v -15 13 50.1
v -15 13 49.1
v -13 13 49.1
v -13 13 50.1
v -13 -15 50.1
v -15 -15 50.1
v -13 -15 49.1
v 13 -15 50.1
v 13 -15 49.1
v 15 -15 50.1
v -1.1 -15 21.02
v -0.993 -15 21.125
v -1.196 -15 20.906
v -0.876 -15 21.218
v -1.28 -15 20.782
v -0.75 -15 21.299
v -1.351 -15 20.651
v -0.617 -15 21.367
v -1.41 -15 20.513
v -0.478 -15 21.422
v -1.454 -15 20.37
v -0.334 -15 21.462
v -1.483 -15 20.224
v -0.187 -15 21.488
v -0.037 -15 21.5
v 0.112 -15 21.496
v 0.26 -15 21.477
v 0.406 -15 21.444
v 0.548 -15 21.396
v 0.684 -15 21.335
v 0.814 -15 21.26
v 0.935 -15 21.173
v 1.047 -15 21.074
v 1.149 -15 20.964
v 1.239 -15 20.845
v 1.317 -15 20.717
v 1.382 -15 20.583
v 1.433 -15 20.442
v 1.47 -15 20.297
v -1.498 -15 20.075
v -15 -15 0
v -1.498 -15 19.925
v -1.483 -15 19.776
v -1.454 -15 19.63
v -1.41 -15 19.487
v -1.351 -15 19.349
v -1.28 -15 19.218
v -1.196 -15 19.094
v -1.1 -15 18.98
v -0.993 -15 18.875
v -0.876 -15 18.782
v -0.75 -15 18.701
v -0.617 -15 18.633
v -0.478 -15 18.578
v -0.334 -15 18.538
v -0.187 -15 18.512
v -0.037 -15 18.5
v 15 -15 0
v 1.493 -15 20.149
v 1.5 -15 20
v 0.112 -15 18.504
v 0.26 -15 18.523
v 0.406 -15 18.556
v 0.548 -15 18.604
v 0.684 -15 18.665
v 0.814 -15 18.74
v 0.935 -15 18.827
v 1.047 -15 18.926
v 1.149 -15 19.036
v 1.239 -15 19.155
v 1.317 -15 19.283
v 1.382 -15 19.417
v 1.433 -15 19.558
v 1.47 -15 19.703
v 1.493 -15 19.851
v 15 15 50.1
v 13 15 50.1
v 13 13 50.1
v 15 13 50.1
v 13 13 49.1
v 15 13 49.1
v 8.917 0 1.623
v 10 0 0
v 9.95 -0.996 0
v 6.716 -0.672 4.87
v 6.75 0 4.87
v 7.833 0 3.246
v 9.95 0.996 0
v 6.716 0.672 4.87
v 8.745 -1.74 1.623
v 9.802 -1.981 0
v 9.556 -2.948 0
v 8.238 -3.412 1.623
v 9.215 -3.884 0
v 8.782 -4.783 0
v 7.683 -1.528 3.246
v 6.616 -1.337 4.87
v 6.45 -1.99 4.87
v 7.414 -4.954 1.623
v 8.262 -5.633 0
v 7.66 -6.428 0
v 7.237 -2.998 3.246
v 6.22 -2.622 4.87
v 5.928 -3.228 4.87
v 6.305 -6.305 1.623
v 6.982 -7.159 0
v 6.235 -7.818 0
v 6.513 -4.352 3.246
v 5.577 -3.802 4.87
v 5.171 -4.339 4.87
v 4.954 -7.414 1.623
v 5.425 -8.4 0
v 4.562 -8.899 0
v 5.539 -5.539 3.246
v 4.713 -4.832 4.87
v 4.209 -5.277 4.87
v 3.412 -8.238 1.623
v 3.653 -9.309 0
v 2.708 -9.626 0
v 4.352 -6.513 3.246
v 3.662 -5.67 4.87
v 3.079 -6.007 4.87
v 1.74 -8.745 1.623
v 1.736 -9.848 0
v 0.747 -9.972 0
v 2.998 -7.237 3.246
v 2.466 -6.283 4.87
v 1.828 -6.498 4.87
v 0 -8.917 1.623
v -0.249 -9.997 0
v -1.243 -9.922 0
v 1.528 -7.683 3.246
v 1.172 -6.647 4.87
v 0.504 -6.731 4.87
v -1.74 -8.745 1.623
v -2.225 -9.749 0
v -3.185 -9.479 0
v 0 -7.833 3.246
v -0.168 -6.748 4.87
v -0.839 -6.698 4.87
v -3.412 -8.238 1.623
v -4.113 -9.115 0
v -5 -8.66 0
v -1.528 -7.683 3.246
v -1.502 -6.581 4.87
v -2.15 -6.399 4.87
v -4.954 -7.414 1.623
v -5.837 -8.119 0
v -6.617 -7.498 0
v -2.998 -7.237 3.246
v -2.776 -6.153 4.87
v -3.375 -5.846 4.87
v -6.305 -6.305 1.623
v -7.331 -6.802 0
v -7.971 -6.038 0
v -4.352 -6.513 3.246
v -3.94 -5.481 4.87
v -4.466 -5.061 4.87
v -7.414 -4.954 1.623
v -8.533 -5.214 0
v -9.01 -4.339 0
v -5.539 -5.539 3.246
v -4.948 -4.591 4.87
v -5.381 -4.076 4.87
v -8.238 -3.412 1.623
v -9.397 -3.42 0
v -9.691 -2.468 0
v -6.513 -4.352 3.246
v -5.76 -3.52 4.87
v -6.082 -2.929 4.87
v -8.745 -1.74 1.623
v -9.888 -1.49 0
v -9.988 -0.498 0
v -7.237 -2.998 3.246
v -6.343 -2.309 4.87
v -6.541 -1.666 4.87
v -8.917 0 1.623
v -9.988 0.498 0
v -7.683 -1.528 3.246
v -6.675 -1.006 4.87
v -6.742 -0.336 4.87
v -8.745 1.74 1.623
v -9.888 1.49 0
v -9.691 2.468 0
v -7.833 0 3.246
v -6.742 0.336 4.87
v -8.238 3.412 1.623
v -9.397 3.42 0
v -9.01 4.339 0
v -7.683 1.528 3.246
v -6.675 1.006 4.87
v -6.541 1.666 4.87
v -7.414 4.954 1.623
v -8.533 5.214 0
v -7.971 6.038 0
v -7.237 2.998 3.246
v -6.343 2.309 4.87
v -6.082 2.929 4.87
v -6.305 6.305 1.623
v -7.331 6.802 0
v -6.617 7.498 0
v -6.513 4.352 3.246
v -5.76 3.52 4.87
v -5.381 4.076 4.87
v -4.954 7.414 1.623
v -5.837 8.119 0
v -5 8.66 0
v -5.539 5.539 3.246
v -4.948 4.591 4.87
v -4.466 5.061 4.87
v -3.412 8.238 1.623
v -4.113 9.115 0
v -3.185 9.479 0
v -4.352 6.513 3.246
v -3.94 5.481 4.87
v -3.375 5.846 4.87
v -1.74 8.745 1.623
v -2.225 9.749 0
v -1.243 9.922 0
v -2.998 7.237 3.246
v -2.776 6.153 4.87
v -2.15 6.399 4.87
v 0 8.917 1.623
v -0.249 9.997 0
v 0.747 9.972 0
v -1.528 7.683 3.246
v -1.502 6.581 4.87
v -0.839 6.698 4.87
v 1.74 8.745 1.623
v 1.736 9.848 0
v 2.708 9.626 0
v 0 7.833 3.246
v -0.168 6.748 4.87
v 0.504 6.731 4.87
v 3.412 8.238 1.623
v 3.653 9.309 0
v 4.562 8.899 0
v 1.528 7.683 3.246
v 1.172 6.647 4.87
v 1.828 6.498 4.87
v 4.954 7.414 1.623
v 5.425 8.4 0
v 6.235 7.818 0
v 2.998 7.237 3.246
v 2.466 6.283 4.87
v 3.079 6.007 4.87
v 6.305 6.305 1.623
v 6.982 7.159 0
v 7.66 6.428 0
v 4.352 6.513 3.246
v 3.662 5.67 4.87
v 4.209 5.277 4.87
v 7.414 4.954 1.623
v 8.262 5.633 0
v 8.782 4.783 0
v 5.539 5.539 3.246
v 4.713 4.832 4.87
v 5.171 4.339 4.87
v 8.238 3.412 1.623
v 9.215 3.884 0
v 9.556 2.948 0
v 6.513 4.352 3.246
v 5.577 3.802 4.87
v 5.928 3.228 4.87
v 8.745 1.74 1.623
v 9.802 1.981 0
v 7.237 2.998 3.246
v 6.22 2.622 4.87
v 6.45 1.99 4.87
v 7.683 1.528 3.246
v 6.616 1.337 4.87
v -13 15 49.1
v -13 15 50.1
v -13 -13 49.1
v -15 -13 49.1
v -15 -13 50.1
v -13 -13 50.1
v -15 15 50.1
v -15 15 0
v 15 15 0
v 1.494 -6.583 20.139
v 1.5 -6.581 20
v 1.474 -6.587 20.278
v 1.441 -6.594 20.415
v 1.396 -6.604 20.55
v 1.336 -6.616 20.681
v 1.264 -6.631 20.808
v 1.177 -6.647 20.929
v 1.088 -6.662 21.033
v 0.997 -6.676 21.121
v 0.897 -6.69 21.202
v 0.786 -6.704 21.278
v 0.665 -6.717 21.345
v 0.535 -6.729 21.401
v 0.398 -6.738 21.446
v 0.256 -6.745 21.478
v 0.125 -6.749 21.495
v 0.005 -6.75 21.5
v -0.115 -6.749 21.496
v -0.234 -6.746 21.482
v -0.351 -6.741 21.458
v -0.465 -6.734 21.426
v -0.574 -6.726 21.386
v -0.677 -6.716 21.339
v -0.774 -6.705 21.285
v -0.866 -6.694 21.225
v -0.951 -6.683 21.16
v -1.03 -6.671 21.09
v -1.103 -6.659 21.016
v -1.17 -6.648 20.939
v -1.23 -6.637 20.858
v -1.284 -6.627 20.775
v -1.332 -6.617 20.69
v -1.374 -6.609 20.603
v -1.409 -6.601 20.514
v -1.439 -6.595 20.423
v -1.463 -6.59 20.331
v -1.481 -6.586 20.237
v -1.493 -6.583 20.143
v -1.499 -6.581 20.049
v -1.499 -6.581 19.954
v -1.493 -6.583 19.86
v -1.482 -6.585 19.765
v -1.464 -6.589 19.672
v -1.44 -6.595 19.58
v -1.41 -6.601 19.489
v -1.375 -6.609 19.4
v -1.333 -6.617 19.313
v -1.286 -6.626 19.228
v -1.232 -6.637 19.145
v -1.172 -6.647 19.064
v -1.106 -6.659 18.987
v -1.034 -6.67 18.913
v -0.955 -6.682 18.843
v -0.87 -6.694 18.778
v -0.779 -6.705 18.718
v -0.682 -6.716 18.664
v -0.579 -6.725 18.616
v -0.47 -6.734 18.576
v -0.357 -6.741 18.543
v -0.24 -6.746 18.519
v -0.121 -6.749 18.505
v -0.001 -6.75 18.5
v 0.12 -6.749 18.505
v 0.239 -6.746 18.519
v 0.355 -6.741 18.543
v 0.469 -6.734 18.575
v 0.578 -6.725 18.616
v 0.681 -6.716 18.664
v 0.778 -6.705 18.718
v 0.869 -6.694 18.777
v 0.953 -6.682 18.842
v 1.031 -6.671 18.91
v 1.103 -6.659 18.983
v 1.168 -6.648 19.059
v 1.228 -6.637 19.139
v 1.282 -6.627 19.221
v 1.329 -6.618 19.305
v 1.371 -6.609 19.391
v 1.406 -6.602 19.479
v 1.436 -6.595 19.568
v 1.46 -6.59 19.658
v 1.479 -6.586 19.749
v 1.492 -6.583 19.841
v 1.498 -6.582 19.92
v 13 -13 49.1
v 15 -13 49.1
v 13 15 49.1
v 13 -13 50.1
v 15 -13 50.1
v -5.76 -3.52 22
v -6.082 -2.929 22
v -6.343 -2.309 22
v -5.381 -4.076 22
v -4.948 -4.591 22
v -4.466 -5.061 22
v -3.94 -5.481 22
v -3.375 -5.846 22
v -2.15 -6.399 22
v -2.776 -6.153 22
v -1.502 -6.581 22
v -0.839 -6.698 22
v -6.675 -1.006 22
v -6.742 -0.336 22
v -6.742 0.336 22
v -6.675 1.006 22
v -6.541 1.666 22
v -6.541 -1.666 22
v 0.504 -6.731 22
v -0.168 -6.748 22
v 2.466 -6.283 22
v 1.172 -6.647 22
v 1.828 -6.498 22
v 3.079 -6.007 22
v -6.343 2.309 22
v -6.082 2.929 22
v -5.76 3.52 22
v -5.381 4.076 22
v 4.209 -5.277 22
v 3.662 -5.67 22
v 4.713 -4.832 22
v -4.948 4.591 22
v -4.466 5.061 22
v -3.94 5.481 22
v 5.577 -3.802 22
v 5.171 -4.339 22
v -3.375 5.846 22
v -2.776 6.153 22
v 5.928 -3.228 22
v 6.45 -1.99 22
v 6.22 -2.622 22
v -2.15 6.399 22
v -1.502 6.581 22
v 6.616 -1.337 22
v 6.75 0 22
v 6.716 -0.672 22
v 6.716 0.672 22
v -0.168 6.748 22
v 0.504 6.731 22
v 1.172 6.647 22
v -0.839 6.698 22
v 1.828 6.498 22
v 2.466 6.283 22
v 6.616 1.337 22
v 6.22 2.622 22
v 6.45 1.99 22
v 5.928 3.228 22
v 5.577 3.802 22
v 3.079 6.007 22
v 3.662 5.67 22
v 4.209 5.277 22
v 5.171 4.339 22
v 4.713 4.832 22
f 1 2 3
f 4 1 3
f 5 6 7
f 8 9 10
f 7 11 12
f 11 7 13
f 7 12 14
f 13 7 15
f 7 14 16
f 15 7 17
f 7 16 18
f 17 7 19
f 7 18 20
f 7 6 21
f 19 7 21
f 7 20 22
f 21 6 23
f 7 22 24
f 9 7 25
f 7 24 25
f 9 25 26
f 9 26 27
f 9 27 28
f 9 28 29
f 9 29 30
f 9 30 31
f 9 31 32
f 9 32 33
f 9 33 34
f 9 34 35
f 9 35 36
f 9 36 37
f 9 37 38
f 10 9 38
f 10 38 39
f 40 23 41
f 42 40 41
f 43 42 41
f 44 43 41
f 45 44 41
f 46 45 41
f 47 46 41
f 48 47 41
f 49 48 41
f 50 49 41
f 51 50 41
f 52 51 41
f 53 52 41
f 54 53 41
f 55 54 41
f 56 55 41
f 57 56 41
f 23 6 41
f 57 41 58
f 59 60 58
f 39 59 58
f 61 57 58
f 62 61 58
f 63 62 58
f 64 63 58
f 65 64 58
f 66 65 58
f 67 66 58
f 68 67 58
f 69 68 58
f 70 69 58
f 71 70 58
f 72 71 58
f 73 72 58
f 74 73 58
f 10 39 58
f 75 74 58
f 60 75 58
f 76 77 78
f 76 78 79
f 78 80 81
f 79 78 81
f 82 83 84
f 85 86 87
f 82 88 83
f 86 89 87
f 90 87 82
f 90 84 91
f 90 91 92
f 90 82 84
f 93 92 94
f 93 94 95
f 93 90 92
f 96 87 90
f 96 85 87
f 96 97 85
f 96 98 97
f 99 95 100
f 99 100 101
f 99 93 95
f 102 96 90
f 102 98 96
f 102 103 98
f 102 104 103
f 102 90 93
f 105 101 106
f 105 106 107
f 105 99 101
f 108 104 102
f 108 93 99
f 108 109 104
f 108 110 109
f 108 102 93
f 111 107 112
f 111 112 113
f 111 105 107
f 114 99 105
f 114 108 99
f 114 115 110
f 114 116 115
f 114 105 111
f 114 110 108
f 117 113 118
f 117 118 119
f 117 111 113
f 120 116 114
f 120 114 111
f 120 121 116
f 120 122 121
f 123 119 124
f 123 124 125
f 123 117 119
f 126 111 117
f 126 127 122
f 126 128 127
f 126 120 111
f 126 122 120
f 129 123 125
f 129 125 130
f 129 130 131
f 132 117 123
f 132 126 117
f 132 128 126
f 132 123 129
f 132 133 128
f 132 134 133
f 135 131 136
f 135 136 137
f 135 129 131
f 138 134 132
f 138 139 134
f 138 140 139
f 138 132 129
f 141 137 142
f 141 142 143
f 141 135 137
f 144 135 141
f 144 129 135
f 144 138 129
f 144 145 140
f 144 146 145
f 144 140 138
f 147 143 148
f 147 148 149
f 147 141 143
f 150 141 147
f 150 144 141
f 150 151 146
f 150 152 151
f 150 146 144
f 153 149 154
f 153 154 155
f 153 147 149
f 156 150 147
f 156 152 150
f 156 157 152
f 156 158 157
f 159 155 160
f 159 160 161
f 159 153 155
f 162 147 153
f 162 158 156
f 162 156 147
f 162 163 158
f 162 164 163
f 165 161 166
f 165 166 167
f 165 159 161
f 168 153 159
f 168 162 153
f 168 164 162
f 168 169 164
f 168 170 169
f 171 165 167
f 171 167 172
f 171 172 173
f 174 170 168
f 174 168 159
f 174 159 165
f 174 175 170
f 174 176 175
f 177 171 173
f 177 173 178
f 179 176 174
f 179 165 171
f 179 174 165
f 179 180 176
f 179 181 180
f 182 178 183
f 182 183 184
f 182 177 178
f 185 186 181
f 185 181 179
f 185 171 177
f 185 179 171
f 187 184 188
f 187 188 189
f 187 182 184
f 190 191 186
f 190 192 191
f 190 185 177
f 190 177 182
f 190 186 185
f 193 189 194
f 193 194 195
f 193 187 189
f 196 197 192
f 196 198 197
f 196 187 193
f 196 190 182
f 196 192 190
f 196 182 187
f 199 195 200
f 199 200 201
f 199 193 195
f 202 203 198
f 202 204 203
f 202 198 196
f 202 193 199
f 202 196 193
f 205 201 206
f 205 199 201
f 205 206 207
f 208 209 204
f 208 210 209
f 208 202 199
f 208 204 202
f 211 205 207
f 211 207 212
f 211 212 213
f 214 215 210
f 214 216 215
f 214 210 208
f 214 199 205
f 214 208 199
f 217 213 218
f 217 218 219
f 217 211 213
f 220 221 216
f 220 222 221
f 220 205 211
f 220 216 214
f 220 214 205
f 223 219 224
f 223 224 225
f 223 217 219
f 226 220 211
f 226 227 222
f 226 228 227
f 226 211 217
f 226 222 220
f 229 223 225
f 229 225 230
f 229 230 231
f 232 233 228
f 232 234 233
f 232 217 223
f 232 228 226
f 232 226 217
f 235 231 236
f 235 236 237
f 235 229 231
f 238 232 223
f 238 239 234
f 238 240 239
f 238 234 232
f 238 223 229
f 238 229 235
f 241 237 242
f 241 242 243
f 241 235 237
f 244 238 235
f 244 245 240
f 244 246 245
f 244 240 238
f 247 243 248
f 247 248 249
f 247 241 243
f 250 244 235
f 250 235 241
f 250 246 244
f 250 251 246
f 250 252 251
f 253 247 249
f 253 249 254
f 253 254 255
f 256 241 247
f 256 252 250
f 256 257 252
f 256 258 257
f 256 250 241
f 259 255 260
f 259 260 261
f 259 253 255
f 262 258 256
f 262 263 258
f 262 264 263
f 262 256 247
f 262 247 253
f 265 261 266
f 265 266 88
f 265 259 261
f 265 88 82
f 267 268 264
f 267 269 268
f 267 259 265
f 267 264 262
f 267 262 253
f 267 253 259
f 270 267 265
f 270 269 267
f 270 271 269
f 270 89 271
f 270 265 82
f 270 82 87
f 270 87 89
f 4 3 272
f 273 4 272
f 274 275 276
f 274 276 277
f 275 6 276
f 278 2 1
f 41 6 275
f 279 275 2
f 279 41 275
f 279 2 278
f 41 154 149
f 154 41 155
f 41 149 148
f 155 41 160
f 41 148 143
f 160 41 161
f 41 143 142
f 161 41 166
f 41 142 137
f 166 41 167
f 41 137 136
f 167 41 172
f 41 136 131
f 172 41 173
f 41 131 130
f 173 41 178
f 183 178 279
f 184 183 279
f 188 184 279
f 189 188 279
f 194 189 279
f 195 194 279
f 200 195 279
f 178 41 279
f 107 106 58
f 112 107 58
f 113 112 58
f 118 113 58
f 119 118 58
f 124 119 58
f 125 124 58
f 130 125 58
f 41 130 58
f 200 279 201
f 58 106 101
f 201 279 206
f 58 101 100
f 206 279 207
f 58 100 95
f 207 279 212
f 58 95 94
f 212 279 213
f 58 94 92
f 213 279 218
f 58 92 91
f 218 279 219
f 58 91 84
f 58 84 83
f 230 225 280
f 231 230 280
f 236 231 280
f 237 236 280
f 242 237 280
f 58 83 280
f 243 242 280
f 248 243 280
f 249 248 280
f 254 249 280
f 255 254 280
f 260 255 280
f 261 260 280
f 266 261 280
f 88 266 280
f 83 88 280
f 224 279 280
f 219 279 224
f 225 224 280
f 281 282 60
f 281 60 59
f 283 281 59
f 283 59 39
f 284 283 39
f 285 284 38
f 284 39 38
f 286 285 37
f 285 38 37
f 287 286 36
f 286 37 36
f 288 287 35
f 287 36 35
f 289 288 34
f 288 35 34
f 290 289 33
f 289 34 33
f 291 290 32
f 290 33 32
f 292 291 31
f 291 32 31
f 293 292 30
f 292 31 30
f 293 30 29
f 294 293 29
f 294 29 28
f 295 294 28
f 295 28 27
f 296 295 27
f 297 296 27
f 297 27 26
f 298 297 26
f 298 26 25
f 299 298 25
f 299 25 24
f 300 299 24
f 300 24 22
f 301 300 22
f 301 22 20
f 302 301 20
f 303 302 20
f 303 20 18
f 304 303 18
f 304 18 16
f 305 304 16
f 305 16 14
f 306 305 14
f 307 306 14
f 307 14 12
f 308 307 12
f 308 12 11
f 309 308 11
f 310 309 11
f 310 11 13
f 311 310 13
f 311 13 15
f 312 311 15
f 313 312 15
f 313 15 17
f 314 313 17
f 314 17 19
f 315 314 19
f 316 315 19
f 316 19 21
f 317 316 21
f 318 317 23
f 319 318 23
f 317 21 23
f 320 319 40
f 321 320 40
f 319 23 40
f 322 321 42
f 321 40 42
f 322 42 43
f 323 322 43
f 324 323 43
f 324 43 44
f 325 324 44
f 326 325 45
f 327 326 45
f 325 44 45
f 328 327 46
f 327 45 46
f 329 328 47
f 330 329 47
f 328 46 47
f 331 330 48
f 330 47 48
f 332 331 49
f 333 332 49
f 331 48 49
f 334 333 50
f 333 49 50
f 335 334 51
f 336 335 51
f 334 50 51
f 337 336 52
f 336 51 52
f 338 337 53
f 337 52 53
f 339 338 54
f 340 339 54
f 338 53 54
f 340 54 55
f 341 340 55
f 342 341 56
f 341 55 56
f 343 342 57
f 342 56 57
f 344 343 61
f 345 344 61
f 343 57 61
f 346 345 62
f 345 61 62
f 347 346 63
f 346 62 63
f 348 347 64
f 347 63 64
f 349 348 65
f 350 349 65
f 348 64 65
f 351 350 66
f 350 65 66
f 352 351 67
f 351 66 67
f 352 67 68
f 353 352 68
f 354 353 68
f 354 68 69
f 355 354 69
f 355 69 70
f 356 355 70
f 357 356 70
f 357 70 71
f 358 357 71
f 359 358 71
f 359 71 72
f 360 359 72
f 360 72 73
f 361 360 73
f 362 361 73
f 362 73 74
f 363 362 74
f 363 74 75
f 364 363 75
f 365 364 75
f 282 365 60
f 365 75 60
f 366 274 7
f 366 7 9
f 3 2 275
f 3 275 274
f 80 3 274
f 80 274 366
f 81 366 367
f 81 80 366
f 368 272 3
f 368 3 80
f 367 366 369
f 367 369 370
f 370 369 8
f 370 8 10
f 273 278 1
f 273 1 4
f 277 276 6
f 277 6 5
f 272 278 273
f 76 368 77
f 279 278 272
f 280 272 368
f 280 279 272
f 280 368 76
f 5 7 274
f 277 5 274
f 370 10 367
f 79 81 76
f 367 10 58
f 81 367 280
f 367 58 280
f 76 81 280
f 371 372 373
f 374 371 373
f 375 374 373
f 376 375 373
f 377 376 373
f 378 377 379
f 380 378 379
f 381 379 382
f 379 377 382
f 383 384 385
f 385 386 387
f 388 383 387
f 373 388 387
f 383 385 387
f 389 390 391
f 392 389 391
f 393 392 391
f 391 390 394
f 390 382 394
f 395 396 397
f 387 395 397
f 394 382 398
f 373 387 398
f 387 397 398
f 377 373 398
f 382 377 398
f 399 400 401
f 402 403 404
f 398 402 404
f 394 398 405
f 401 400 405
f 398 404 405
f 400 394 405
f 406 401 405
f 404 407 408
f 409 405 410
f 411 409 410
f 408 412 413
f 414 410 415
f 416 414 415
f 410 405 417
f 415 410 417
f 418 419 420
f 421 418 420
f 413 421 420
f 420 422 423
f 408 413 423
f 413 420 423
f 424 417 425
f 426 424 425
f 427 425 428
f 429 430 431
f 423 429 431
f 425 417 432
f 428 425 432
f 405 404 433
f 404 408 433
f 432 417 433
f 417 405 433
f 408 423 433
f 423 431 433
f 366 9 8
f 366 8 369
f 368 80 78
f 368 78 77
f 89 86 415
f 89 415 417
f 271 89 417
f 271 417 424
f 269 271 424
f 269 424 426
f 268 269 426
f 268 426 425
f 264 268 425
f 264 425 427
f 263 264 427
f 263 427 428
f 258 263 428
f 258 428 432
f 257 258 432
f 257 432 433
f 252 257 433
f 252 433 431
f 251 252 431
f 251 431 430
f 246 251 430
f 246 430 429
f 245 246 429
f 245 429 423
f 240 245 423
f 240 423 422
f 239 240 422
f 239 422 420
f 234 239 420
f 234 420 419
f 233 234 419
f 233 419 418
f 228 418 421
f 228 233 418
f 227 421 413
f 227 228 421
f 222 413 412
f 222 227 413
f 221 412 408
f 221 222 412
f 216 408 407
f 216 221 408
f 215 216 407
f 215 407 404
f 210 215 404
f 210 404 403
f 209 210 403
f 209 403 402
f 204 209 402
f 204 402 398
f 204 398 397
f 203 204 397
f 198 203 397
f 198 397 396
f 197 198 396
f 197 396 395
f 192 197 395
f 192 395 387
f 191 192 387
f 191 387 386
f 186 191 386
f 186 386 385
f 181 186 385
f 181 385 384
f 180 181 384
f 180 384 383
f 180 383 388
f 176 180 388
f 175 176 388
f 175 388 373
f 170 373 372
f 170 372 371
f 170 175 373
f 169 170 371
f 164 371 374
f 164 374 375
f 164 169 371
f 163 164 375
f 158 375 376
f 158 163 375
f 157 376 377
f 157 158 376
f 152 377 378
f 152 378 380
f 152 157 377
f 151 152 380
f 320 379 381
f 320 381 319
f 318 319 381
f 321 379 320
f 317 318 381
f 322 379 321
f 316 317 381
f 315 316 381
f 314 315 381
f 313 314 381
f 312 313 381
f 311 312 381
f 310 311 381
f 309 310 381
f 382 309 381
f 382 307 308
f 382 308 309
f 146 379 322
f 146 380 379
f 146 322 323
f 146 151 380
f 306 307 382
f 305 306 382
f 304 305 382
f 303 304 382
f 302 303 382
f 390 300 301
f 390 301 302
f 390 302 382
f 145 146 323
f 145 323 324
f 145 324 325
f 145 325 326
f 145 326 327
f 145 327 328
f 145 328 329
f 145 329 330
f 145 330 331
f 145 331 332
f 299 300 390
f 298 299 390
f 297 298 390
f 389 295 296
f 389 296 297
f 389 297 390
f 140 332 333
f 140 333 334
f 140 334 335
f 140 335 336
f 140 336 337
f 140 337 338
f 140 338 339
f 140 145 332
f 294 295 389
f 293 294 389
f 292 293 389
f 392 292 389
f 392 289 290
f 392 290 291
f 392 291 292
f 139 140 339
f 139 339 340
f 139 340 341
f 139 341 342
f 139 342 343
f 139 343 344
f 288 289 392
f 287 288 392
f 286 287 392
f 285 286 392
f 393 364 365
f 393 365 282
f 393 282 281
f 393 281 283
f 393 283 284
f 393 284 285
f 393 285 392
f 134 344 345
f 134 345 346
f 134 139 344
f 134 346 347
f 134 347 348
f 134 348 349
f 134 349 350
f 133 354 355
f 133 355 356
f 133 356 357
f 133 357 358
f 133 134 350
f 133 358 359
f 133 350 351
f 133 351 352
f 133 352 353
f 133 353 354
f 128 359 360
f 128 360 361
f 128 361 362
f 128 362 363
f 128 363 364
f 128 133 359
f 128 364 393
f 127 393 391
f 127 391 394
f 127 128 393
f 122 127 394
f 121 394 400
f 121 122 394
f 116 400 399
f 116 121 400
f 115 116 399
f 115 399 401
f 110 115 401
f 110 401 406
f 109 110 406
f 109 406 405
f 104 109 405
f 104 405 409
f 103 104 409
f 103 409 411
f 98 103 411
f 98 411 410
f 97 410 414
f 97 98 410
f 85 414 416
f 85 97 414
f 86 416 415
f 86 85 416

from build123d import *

# Parameters (mm, degrees)
F0_W     = 30
F0_H     = 30
F1_DEPTH = 49.1
F2_R     = 6.75
F3_DEPTH = 22
F4_W     = 2
F4_H     = 2
F5_DEPTH = 1
F8_R     = 1.5
F9_DEPTH = 8.4197768095


with BuildPart() as f1:
    # F0 (on Top) → F1 (new body)
    with BuildSketch(Plane.XY):
        Rectangle(F0_W, F0_H)
    extrude(amount=F1_DEPTH)

    # F2 (on Top) → F3 (cut)
    with BuildSketch(Plane.XY):
        Circle(F2_R)
    extrude(amount=F3_DEPTH, mode=Mode.SUBTRACT)

    # F4 (on face) → F5 (join)
    with BuildSketch(Plane.XY.offset(49.1)):
        with Locations((14, 14)):
            Rectangle(F4_W, F4_H)
        with Locations((14, -14)):
            Rectangle(F4_W, F4_H)
        with Locations((-14, -14)):
            Rectangle(F4_W, F4_H)
        with Locations((-14, 14)):
            Rectangle(F4_W, F4_H)
    extrude(amount=F5_DEPTH)

    # F6 (on Front) → F7 (revolve, cut)
    with BuildSketch(Plane.XZ):
        Polygon((0, 14.9834286422), (0, 0), (10, 0), align=None)
    revolve(axis=Axis((0, 0, 7.4917143211), (0, 0, -1)), mode=Mode.SUBTRACT)

    # F8 (on face) → F9 (cut, through all)
    with BuildSketch(Plane.XZ.offset(15)):
        with Locations((0, 20)):
            Circle(F8_R)
    extrude(amount=-F9_DEPTH, mode=Mode.SUBTRACT)


solid = f1.part
